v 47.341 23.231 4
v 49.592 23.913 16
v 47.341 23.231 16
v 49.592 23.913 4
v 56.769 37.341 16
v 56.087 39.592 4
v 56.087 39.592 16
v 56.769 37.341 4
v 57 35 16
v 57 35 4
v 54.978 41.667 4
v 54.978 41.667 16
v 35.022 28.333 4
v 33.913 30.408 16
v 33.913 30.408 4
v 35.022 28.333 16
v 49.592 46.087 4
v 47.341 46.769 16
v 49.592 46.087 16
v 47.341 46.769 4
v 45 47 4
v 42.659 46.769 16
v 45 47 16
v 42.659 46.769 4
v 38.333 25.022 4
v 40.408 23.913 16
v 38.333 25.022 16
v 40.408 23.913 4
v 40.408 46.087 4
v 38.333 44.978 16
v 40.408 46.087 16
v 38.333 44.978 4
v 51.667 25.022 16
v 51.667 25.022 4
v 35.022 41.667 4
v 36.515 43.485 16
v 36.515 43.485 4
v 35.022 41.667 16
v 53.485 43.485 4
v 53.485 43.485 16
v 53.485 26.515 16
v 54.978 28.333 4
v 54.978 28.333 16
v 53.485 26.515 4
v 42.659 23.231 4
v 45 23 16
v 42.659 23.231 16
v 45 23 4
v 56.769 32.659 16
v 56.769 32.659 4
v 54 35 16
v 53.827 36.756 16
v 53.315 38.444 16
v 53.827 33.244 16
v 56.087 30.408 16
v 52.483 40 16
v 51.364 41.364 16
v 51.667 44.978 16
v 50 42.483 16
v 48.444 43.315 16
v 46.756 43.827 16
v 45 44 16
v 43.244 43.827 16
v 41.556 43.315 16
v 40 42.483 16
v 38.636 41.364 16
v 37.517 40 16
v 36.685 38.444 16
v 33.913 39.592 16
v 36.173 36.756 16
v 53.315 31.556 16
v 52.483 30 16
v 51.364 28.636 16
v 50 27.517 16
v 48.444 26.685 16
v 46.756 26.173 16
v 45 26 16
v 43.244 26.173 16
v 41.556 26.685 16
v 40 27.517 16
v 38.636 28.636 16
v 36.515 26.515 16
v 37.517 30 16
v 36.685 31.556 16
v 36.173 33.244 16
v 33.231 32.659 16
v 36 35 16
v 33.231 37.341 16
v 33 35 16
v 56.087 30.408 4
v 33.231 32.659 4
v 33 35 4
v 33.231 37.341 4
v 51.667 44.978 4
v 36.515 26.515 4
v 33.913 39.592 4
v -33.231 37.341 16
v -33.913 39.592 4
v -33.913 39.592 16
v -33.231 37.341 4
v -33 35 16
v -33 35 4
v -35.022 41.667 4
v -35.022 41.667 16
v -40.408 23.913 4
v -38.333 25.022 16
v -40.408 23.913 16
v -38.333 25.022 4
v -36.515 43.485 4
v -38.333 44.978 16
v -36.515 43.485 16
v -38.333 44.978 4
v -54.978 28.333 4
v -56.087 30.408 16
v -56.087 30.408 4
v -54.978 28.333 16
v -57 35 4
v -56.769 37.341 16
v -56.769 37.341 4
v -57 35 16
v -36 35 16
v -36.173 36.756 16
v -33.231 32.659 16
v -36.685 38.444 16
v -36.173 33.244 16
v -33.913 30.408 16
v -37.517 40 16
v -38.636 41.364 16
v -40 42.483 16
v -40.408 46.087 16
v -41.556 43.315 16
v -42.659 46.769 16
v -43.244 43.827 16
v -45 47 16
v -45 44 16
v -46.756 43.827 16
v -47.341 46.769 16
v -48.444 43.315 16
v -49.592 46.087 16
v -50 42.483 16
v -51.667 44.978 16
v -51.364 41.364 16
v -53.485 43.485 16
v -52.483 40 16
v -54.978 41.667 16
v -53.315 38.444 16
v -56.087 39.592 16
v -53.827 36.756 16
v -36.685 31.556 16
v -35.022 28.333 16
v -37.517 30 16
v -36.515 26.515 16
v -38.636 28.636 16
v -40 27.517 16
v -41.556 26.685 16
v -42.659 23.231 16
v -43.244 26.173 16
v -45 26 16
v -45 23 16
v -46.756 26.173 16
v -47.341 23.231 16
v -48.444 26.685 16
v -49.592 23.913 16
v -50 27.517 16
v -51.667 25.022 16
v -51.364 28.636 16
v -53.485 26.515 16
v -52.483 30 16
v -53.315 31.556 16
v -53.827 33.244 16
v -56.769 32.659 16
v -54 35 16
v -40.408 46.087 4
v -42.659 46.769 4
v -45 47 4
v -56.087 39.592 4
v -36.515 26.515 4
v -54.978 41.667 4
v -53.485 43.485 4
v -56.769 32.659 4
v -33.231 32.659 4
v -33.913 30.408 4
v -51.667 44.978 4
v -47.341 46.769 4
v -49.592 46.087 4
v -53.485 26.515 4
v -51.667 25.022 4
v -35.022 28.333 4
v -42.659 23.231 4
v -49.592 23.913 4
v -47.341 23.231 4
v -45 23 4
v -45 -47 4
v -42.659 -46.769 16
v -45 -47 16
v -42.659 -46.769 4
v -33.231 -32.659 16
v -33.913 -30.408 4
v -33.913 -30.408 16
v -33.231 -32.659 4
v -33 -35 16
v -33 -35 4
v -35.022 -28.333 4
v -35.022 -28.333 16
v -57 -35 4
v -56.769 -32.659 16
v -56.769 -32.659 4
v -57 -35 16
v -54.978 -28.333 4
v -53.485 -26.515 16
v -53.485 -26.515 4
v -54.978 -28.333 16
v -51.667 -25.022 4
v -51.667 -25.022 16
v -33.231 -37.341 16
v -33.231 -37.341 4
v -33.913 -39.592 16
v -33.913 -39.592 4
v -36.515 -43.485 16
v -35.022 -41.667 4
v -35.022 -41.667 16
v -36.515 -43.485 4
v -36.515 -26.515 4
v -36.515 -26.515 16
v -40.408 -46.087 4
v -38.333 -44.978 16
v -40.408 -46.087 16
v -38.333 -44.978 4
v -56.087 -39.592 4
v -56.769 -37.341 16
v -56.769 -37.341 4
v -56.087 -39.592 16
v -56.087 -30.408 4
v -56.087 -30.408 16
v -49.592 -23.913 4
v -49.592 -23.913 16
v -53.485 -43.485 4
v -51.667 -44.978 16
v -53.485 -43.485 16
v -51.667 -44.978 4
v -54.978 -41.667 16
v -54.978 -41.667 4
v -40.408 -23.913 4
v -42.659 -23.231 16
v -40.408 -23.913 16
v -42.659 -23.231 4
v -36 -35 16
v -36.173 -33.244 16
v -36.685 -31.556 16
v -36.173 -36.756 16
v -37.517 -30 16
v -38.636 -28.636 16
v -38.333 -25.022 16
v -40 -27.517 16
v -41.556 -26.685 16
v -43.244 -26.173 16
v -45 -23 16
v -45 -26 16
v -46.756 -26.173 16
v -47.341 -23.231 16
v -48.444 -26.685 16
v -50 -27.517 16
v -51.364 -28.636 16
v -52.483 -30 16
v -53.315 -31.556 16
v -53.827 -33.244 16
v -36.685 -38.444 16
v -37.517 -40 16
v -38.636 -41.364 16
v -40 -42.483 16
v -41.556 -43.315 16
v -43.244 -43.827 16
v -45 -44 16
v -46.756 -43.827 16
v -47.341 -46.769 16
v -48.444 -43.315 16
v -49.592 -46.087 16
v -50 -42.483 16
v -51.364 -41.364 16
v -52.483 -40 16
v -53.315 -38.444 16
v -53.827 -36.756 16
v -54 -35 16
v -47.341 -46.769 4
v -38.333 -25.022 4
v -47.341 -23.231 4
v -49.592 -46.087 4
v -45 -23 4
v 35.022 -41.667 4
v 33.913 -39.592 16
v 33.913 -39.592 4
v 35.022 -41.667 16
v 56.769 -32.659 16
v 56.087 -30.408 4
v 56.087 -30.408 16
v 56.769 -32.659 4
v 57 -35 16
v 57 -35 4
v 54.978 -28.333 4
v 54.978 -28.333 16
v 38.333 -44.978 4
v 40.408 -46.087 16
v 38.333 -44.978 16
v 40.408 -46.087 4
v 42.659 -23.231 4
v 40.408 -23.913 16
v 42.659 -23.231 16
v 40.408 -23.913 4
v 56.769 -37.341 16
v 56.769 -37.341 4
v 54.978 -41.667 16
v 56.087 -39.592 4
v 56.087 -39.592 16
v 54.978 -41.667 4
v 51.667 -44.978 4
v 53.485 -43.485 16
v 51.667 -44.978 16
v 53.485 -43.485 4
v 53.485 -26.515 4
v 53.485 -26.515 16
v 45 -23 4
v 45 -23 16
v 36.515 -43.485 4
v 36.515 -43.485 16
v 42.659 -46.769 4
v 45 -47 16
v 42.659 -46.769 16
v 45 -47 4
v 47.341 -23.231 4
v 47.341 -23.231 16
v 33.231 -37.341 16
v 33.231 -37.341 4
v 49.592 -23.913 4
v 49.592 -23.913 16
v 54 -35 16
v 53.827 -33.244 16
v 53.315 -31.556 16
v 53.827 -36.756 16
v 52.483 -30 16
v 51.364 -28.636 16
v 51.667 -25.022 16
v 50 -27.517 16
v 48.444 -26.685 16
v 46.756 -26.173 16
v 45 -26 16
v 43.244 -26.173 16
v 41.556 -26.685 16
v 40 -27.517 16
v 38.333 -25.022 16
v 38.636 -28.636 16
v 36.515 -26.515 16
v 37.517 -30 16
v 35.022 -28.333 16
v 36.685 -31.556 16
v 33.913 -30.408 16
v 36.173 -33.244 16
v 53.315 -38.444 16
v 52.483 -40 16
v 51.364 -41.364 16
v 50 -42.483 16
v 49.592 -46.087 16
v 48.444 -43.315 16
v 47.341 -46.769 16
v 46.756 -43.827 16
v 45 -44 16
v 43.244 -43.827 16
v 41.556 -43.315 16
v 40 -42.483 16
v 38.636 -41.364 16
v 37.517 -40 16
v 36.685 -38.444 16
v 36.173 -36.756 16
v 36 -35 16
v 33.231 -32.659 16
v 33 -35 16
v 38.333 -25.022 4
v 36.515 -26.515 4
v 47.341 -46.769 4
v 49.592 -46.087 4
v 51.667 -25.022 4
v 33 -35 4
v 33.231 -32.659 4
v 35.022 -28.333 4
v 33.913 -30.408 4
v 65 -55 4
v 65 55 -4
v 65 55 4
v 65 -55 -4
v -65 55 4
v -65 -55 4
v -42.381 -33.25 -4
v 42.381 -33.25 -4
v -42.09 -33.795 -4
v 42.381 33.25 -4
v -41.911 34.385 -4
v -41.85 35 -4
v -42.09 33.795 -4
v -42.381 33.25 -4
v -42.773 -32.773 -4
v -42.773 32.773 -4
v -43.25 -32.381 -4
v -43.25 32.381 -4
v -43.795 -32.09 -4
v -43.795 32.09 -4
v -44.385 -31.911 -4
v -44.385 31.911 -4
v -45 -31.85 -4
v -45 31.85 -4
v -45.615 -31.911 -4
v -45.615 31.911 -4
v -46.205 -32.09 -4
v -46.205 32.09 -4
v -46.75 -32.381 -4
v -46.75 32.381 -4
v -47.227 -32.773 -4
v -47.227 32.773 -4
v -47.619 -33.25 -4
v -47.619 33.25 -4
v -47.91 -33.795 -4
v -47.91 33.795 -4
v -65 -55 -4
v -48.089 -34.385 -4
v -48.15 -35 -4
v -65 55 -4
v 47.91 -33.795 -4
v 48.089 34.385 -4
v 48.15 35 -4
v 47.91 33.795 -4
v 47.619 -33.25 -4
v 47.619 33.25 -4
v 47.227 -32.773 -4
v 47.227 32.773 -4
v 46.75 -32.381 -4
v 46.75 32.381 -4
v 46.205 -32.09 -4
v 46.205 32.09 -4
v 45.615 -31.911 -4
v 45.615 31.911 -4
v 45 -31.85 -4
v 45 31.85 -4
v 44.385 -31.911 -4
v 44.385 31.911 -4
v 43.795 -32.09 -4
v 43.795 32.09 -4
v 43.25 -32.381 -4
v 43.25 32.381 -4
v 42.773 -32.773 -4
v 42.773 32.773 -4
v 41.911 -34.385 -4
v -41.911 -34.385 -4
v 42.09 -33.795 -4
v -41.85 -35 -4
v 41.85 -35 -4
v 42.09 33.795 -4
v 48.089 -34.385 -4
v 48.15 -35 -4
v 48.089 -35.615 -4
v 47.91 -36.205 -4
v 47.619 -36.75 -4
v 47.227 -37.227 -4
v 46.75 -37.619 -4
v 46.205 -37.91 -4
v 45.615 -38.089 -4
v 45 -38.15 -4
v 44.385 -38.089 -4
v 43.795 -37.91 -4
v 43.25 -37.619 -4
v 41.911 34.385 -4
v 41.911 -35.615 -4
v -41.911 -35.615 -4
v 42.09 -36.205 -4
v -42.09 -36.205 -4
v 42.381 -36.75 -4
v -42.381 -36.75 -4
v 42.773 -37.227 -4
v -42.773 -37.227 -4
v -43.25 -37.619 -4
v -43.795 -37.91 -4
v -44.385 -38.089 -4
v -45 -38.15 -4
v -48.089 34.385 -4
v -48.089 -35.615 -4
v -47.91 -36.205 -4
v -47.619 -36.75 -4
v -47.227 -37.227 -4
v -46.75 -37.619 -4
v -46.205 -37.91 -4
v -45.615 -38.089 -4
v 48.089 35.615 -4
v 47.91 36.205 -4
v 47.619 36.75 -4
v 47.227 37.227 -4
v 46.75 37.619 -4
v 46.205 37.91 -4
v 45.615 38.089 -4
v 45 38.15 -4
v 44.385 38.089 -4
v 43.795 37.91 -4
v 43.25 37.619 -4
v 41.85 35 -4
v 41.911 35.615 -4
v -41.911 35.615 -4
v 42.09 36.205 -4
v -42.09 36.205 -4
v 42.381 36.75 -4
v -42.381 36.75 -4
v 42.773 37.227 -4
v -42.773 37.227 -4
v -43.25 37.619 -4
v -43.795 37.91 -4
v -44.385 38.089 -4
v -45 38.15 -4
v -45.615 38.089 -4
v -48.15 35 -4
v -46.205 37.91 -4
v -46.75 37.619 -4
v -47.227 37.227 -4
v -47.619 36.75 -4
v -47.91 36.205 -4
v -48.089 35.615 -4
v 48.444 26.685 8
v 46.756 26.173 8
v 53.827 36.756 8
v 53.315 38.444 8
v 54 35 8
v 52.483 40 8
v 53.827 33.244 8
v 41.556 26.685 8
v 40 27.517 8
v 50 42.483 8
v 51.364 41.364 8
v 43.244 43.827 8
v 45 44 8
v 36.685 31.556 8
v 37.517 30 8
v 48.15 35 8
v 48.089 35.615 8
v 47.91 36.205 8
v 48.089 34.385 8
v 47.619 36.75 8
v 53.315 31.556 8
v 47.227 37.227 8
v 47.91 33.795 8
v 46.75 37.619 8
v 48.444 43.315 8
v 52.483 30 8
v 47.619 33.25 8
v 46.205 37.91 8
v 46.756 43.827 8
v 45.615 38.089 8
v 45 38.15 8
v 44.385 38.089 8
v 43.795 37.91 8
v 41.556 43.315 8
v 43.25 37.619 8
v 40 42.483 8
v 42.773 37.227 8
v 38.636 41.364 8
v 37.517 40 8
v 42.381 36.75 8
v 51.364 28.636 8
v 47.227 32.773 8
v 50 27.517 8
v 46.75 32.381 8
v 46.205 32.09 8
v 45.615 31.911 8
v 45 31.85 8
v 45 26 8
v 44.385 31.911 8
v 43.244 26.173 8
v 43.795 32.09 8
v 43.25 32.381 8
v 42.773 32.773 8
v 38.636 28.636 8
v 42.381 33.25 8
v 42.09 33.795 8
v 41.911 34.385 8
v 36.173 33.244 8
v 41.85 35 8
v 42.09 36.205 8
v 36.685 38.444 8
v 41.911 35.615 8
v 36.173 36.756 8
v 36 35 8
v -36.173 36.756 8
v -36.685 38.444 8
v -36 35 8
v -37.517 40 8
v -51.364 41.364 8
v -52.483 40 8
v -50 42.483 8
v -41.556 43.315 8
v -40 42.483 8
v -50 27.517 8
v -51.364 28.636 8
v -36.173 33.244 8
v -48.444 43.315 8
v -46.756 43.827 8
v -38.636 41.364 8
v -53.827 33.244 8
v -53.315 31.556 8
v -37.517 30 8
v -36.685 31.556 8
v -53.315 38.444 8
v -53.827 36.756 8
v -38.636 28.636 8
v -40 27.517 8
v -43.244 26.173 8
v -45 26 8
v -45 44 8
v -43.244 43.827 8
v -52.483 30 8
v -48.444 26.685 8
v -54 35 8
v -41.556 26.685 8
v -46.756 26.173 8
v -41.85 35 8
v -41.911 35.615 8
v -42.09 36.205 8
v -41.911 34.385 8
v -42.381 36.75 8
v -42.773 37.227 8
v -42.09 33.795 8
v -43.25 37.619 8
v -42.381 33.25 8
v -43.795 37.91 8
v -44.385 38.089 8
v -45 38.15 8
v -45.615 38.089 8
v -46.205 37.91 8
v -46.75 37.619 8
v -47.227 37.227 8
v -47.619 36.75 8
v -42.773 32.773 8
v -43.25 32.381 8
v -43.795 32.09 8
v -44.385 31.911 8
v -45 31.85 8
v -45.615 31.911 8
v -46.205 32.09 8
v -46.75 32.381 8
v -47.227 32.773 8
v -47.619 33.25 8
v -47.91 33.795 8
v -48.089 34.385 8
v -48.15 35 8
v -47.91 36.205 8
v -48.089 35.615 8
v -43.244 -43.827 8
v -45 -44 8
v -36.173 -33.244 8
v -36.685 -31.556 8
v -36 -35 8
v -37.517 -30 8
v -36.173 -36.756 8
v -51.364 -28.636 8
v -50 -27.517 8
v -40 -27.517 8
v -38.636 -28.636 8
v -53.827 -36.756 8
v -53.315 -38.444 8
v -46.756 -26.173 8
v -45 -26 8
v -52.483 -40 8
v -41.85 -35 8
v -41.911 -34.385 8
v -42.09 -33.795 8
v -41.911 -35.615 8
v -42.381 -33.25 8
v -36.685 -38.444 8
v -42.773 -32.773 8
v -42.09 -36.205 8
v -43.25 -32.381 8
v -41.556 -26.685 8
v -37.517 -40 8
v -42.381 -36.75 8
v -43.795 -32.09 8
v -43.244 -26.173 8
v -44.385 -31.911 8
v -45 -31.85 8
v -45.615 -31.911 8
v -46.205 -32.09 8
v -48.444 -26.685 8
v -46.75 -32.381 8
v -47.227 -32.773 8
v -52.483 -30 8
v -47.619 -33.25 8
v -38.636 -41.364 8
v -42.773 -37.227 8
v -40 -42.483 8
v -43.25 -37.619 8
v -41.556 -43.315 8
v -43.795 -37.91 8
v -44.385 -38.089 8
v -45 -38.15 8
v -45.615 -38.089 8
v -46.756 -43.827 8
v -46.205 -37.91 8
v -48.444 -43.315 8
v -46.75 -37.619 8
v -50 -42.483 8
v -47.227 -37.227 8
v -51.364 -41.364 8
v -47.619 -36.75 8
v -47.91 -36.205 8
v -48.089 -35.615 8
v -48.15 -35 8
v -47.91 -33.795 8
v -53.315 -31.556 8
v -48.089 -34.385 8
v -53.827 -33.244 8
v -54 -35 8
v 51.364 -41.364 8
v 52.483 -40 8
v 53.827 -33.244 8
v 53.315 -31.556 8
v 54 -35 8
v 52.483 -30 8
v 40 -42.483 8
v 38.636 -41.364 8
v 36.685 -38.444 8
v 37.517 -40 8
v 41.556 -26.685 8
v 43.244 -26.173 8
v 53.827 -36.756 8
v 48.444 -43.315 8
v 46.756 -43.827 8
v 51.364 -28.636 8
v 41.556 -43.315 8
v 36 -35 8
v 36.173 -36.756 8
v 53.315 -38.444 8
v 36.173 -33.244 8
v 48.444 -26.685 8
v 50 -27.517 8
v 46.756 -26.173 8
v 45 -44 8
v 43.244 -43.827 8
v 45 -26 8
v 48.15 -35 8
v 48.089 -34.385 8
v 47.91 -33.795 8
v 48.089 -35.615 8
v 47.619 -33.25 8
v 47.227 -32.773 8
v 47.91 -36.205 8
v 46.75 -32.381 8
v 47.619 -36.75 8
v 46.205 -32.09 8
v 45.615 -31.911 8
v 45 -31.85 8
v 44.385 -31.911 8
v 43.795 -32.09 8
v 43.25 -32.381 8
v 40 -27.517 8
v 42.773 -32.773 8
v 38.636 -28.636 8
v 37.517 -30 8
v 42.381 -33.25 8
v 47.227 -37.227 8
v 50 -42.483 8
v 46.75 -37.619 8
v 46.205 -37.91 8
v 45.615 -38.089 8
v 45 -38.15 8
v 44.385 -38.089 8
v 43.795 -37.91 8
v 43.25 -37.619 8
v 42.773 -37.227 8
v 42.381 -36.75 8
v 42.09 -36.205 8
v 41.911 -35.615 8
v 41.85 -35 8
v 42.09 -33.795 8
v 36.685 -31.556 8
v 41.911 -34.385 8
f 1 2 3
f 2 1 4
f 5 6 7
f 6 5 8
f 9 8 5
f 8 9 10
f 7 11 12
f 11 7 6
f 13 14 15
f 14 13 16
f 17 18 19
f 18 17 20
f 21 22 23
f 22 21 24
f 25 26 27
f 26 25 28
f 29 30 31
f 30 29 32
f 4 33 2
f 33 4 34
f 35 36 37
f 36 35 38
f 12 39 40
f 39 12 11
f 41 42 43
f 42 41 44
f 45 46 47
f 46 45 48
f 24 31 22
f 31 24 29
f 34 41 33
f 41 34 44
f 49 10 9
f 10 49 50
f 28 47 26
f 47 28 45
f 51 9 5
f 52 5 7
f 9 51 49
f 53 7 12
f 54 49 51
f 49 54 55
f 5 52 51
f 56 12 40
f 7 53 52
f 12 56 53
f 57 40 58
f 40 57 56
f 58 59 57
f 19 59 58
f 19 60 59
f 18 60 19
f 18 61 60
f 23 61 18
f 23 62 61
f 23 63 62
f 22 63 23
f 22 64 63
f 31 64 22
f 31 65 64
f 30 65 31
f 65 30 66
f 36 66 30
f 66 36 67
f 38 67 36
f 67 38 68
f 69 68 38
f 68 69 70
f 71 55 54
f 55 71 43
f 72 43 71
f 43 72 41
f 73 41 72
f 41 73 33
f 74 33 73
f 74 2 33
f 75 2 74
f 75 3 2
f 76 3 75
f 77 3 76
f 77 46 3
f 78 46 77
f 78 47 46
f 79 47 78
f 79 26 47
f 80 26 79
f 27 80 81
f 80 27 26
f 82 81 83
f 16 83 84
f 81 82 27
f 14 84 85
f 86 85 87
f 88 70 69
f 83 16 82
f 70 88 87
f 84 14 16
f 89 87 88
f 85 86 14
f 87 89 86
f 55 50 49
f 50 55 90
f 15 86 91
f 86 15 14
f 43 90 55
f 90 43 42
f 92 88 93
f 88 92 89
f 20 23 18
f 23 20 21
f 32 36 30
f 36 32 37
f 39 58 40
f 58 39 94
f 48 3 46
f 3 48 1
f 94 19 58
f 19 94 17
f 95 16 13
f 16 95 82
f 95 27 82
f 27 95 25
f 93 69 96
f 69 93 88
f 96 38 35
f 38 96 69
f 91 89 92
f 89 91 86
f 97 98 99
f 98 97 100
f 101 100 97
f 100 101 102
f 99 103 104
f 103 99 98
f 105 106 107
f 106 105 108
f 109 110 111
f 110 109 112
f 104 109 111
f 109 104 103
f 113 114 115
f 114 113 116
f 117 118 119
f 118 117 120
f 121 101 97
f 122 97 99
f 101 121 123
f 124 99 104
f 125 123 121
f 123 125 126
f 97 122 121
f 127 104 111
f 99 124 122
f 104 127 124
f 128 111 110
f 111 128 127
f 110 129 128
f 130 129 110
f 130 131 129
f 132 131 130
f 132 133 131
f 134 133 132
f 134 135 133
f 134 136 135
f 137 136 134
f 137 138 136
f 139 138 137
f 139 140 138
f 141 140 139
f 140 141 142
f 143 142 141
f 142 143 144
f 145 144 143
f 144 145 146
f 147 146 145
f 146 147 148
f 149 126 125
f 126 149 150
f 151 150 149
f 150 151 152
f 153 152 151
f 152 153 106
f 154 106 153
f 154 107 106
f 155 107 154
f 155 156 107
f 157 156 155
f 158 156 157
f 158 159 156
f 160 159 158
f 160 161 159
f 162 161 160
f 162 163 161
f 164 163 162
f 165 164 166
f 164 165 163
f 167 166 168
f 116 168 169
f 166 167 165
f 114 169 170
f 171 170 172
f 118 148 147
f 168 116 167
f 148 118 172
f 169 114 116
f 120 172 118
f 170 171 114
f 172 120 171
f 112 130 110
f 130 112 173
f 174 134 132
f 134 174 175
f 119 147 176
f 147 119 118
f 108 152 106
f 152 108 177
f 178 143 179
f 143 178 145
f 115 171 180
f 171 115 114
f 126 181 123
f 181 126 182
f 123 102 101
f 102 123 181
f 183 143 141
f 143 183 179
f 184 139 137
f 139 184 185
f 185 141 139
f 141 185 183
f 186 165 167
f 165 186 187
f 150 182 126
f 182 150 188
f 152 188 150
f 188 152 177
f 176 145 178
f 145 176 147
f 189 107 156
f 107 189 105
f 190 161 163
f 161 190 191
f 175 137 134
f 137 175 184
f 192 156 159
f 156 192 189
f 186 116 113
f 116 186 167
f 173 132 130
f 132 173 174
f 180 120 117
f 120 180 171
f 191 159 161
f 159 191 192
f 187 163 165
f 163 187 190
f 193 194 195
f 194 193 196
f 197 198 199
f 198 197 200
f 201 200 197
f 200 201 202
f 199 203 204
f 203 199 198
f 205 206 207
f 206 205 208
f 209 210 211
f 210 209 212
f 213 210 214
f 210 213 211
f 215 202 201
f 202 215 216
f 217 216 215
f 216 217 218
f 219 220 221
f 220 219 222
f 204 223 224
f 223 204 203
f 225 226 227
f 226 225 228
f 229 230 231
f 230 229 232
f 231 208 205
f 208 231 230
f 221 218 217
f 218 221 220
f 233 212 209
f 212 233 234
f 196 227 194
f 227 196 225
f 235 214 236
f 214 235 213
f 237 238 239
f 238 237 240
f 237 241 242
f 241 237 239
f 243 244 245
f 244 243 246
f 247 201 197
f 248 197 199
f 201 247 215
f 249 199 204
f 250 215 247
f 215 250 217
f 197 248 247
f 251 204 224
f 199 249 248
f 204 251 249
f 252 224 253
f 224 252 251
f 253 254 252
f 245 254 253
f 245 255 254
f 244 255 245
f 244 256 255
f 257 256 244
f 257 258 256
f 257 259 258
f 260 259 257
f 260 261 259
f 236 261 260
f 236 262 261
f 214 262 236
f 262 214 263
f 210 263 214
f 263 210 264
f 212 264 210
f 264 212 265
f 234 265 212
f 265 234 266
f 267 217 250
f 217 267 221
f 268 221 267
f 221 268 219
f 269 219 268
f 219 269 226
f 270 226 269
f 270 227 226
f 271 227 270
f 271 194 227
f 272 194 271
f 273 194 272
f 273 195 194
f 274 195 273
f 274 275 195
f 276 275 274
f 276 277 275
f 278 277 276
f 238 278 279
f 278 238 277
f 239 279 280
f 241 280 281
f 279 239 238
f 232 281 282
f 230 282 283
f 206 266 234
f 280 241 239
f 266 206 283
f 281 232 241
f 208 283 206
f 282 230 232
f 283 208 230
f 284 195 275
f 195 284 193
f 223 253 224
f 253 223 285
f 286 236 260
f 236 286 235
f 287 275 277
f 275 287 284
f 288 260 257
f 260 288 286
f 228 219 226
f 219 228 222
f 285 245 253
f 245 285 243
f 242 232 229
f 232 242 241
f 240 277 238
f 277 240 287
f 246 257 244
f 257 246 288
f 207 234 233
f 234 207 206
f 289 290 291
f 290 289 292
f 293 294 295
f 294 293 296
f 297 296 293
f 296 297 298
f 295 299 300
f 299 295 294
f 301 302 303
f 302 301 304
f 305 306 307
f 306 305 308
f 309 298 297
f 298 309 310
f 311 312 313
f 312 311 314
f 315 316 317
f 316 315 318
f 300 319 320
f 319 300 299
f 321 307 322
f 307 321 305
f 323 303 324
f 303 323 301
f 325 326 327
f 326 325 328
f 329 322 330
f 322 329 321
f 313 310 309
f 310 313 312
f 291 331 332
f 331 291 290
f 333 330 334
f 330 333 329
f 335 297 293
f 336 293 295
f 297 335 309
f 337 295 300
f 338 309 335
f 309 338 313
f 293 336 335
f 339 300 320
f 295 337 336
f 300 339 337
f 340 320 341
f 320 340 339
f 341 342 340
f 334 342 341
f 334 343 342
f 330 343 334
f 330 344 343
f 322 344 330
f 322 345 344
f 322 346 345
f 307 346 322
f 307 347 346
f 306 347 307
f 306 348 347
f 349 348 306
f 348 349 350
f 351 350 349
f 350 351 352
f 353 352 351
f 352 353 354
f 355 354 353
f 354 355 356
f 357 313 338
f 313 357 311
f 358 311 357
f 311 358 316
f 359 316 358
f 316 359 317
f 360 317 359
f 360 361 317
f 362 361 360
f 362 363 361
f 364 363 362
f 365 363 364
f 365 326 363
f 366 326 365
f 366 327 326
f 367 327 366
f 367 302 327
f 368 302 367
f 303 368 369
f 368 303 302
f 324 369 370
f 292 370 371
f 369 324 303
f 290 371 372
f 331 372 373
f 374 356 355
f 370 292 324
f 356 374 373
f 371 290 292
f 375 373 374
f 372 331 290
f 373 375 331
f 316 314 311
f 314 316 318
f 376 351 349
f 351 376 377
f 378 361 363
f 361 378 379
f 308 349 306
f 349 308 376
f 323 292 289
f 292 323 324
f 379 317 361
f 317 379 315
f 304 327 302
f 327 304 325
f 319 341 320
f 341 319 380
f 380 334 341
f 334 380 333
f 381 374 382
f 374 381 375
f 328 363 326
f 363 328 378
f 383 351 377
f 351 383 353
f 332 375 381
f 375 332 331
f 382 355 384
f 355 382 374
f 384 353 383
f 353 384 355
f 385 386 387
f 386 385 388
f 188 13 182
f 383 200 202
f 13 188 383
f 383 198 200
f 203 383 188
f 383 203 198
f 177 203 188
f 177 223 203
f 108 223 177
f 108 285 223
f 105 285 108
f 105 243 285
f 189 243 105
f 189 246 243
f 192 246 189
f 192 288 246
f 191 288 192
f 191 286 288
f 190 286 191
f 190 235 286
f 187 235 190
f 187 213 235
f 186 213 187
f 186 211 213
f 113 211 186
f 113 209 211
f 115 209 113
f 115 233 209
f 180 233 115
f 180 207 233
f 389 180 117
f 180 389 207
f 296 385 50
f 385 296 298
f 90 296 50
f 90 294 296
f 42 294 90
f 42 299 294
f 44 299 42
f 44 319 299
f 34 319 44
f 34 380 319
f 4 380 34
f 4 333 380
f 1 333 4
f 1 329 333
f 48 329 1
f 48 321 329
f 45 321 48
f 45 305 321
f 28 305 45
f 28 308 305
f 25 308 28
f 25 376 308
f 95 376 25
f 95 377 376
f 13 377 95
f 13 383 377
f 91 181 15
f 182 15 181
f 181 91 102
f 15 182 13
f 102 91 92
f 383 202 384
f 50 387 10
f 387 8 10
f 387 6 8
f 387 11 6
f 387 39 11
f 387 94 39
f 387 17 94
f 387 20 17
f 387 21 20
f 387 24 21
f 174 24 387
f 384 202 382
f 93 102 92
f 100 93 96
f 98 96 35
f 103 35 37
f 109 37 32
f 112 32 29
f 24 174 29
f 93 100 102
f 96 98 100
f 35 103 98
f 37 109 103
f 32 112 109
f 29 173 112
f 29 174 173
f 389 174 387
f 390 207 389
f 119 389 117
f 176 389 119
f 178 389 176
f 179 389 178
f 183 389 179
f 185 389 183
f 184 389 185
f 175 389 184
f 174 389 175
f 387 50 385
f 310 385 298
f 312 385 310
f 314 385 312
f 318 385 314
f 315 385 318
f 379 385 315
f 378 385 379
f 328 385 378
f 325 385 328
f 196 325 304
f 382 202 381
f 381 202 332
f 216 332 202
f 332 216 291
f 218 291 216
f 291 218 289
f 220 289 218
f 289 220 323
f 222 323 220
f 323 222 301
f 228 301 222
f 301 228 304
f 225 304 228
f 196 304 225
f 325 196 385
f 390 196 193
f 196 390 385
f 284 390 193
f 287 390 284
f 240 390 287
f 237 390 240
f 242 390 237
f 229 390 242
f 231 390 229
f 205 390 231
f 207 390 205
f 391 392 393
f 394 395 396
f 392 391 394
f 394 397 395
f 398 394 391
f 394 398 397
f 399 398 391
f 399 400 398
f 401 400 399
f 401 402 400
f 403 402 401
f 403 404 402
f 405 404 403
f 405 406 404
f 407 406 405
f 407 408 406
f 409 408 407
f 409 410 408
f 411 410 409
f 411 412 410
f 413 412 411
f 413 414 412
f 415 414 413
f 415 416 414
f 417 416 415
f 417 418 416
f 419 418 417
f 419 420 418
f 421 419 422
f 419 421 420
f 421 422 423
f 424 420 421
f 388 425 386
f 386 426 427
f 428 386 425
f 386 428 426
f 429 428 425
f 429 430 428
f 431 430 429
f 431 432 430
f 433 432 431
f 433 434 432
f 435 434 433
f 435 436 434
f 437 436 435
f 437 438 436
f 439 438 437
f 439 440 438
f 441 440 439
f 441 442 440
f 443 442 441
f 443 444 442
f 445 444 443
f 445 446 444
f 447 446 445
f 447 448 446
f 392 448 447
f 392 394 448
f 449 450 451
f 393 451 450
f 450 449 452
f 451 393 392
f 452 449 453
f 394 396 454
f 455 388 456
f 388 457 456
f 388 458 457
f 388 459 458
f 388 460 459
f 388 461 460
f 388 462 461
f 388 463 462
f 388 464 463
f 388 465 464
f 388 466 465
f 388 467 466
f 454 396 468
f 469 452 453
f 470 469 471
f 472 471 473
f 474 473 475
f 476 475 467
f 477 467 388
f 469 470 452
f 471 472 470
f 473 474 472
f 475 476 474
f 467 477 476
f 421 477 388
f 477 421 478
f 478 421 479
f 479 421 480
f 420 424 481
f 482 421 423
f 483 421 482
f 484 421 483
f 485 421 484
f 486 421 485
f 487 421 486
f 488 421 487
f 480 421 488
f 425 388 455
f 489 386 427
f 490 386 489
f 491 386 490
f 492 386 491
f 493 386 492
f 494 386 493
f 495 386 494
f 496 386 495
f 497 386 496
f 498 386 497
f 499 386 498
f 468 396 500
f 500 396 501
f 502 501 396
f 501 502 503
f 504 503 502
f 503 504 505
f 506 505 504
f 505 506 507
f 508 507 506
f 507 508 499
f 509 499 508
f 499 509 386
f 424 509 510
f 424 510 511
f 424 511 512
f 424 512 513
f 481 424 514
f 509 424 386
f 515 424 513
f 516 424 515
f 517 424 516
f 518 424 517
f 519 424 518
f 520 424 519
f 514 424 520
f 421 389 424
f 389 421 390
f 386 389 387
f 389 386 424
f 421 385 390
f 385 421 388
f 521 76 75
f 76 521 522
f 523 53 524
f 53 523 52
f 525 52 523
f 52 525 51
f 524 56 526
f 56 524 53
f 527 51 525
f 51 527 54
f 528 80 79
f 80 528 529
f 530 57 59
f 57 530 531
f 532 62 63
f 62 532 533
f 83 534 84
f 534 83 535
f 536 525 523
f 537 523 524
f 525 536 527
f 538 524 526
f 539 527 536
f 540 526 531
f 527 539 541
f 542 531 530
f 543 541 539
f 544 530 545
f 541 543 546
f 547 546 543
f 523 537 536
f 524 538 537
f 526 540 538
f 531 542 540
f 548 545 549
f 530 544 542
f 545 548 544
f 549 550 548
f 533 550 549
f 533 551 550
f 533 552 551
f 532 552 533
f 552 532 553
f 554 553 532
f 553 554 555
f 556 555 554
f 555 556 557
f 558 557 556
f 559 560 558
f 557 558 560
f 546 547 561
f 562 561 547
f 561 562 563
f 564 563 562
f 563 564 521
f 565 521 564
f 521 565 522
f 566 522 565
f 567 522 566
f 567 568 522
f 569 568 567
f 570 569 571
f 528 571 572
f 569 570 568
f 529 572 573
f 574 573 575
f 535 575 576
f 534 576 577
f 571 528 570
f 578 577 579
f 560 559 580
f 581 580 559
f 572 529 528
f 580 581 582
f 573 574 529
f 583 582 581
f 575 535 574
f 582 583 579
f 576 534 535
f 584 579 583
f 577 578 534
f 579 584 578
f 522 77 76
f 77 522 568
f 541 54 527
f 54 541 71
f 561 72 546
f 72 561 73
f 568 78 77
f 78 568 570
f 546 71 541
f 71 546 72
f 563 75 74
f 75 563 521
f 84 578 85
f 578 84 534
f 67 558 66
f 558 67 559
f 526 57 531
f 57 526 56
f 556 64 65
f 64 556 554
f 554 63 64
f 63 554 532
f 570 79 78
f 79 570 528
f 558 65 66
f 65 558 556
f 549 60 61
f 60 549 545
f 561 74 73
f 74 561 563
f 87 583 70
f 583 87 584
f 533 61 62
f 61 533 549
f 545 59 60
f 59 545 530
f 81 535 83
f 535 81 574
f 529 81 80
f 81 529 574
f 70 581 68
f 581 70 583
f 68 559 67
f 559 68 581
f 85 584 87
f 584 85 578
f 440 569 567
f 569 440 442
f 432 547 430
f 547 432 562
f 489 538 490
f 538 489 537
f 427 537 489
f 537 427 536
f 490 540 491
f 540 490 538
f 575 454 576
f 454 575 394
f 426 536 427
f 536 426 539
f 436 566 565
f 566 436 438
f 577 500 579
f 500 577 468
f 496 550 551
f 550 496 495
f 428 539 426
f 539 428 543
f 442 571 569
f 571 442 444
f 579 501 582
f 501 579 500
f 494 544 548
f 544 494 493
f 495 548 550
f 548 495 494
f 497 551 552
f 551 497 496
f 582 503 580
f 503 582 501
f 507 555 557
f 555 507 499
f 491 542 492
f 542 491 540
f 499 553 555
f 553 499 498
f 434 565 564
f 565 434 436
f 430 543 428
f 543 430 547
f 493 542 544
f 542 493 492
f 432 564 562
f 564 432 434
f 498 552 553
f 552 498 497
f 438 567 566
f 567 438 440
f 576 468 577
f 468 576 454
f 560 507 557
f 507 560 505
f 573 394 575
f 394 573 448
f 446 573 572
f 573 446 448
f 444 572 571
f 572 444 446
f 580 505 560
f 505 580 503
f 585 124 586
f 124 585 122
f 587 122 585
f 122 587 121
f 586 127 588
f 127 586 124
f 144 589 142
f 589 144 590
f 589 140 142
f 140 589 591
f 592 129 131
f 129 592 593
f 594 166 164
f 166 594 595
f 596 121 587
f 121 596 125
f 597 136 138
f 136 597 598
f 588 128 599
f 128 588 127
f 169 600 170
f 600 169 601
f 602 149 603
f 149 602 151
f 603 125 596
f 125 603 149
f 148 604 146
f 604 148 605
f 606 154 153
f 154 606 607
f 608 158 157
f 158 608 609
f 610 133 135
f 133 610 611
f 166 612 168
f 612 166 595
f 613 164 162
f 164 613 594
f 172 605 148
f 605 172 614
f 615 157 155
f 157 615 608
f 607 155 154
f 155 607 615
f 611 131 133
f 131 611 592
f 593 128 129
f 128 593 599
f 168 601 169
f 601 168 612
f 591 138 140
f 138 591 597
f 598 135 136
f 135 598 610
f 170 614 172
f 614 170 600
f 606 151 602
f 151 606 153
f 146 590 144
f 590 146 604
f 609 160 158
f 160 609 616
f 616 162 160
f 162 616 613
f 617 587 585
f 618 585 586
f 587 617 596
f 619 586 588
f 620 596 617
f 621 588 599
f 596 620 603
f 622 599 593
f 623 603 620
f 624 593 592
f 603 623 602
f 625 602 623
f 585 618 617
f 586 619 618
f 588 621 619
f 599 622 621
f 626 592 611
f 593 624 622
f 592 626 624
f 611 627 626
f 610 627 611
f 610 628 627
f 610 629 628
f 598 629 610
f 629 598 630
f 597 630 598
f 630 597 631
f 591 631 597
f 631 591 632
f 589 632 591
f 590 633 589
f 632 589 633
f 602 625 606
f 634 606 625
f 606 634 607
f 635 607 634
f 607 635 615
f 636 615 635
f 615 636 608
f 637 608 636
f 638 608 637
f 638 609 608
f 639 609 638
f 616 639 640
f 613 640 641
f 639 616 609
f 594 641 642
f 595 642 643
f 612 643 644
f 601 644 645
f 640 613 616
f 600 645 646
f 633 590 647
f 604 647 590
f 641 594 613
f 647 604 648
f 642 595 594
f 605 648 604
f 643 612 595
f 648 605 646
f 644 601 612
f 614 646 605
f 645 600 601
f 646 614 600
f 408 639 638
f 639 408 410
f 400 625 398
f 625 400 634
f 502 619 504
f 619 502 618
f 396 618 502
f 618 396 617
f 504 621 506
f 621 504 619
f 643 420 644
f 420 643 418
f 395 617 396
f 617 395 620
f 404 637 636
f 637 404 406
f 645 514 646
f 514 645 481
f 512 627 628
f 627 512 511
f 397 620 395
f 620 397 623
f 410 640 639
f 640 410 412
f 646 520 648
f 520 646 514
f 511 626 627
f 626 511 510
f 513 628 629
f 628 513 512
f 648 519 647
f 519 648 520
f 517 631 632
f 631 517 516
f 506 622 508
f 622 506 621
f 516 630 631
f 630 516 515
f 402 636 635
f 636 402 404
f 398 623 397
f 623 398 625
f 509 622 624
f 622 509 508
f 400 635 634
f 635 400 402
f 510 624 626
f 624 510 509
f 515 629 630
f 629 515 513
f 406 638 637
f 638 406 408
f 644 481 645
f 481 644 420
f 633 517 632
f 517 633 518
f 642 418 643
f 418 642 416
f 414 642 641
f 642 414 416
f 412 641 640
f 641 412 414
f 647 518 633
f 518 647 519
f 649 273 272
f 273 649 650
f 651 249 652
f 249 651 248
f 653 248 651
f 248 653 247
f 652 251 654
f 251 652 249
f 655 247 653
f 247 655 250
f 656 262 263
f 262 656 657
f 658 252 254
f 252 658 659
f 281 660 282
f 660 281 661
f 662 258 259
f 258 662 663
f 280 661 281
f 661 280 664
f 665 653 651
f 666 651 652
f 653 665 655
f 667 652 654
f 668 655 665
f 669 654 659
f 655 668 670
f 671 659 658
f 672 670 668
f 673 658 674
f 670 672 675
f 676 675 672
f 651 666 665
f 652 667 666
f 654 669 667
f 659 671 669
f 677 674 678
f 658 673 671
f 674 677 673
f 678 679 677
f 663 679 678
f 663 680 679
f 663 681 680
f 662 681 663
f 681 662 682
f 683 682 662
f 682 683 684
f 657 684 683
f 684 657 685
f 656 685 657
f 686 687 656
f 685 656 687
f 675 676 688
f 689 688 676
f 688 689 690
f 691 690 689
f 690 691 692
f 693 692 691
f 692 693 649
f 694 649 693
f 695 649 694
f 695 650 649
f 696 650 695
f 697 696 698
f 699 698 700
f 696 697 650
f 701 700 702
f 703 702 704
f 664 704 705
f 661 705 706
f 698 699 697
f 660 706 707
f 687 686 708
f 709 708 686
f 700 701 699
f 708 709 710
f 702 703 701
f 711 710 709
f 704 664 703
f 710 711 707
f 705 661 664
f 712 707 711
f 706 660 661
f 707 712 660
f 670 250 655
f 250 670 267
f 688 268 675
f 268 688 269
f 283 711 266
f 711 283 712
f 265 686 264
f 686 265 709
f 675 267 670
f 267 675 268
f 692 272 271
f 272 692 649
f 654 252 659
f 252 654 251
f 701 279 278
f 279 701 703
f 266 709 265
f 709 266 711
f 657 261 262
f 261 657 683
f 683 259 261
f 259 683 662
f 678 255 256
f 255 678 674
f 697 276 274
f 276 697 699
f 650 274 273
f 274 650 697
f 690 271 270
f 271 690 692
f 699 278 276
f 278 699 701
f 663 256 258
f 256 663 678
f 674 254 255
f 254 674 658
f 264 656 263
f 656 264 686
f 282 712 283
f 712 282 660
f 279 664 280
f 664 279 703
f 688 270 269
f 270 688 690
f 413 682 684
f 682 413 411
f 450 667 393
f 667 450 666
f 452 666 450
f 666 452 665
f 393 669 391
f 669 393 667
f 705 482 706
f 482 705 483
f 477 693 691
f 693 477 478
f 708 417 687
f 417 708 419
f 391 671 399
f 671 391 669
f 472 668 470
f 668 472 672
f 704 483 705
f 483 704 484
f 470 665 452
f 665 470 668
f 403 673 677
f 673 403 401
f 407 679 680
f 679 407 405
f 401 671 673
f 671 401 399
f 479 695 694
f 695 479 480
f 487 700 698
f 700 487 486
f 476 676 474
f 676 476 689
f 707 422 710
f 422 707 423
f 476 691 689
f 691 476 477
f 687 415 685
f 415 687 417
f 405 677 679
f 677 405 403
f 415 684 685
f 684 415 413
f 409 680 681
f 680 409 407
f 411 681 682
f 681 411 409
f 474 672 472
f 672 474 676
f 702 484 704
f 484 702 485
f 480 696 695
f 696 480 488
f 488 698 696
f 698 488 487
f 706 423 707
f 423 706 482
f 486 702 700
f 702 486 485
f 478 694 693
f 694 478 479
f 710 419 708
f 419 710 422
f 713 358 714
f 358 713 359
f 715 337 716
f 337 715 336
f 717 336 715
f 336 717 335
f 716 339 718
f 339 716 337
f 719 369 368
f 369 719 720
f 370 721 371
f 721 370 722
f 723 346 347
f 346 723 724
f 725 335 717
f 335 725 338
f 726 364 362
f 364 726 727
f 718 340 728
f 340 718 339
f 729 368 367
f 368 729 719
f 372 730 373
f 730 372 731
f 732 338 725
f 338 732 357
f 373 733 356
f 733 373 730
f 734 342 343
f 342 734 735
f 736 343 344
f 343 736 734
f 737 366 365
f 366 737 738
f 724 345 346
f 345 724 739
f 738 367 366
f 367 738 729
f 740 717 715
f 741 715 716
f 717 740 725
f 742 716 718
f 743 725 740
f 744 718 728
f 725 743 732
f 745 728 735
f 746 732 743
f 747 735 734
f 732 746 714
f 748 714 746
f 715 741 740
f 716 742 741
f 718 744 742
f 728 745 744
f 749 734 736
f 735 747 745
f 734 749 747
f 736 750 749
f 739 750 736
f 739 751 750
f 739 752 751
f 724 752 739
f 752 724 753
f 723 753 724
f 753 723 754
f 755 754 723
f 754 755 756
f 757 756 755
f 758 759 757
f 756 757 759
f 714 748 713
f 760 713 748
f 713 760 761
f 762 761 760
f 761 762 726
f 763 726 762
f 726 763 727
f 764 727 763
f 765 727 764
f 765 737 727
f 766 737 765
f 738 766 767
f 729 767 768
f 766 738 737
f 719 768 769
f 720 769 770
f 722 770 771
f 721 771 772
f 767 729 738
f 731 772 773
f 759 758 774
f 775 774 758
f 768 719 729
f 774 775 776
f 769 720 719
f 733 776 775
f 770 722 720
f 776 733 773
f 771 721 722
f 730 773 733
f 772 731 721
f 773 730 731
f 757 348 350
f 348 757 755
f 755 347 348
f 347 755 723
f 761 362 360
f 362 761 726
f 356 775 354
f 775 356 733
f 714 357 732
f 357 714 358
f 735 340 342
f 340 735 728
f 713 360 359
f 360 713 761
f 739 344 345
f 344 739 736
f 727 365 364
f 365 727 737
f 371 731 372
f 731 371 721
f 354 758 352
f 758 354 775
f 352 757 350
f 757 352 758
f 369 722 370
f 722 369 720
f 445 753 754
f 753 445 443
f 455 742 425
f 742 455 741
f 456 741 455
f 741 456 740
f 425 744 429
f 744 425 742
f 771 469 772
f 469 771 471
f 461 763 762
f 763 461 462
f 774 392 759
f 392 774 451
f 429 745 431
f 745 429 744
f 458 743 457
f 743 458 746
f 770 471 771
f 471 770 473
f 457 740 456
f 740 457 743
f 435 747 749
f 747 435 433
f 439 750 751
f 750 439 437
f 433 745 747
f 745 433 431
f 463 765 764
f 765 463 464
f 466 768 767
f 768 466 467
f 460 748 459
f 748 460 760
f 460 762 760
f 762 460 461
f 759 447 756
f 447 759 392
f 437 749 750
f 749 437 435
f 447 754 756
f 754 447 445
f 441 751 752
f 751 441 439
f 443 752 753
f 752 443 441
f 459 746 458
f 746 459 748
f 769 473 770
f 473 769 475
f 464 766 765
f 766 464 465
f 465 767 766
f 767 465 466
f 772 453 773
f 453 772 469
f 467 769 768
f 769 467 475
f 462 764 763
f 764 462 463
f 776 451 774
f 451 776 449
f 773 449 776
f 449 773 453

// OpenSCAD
$fn = 32;

// ----------------------------------------------------------------------
// Socket pad plate
// bosses with counterbored sockets for the screws
// ----------------------------------------------------------------------

// --- parameters (mm) ---
base_t = 8;             // base plate thickness
boss_h = 12;            // boss height above the base plate
boss_d = 24;            // boss diameter
socket_d = 18;          // socket diameter
socket_depth = 8;       // socket depth from the boss face
bolt_d = 6.3;           // screw clearance hole through the socket floor
plate = [130, 110, 8];  // overall size (x, y, z)
edge = 20;              // boss centre offset from the plate edge
pads = 4;               // boss count, one per corner

// --- derived feature positions (mm) ---
height = base_t + boss_h;        // = 20   overall height of the part
corner_x = plate[0] / 2 - edge;  // = 45   boss centre X
corner_y = plate[1] / 2 - edge;  // = 35   boss centre Y
feature_centers = [
  [corner_x, corner_y],
  [-corner_x, corner_y],
  [-corner_x, -corner_y],
  [corner_x, -corner_y]
];   // boss centres: sockets, holes and the pads themselves are placed from here

// base plate, bosses on feature_centers, socket + through hole in each
difference() {
  union() {
    cube(plate, center = true);
    for (centre = feature_centers)
      translate([centre[0], centre[1], plate[2] / 2 - 1])
        cylinder(d = boss_d, h = boss_h + 1);
  }
  for (centre = feature_centers) {
    translate([centre[0], centre[1], plate[2] / 2 + boss_h - socket_depth])
      cylinder(d = socket_d, h = socket_depth + 1);
    translate([centre[0], centre[1], -height])
      cylinder(d = bolt_d, h = 2 * height + 2);  // through the socket floor
  }
}
